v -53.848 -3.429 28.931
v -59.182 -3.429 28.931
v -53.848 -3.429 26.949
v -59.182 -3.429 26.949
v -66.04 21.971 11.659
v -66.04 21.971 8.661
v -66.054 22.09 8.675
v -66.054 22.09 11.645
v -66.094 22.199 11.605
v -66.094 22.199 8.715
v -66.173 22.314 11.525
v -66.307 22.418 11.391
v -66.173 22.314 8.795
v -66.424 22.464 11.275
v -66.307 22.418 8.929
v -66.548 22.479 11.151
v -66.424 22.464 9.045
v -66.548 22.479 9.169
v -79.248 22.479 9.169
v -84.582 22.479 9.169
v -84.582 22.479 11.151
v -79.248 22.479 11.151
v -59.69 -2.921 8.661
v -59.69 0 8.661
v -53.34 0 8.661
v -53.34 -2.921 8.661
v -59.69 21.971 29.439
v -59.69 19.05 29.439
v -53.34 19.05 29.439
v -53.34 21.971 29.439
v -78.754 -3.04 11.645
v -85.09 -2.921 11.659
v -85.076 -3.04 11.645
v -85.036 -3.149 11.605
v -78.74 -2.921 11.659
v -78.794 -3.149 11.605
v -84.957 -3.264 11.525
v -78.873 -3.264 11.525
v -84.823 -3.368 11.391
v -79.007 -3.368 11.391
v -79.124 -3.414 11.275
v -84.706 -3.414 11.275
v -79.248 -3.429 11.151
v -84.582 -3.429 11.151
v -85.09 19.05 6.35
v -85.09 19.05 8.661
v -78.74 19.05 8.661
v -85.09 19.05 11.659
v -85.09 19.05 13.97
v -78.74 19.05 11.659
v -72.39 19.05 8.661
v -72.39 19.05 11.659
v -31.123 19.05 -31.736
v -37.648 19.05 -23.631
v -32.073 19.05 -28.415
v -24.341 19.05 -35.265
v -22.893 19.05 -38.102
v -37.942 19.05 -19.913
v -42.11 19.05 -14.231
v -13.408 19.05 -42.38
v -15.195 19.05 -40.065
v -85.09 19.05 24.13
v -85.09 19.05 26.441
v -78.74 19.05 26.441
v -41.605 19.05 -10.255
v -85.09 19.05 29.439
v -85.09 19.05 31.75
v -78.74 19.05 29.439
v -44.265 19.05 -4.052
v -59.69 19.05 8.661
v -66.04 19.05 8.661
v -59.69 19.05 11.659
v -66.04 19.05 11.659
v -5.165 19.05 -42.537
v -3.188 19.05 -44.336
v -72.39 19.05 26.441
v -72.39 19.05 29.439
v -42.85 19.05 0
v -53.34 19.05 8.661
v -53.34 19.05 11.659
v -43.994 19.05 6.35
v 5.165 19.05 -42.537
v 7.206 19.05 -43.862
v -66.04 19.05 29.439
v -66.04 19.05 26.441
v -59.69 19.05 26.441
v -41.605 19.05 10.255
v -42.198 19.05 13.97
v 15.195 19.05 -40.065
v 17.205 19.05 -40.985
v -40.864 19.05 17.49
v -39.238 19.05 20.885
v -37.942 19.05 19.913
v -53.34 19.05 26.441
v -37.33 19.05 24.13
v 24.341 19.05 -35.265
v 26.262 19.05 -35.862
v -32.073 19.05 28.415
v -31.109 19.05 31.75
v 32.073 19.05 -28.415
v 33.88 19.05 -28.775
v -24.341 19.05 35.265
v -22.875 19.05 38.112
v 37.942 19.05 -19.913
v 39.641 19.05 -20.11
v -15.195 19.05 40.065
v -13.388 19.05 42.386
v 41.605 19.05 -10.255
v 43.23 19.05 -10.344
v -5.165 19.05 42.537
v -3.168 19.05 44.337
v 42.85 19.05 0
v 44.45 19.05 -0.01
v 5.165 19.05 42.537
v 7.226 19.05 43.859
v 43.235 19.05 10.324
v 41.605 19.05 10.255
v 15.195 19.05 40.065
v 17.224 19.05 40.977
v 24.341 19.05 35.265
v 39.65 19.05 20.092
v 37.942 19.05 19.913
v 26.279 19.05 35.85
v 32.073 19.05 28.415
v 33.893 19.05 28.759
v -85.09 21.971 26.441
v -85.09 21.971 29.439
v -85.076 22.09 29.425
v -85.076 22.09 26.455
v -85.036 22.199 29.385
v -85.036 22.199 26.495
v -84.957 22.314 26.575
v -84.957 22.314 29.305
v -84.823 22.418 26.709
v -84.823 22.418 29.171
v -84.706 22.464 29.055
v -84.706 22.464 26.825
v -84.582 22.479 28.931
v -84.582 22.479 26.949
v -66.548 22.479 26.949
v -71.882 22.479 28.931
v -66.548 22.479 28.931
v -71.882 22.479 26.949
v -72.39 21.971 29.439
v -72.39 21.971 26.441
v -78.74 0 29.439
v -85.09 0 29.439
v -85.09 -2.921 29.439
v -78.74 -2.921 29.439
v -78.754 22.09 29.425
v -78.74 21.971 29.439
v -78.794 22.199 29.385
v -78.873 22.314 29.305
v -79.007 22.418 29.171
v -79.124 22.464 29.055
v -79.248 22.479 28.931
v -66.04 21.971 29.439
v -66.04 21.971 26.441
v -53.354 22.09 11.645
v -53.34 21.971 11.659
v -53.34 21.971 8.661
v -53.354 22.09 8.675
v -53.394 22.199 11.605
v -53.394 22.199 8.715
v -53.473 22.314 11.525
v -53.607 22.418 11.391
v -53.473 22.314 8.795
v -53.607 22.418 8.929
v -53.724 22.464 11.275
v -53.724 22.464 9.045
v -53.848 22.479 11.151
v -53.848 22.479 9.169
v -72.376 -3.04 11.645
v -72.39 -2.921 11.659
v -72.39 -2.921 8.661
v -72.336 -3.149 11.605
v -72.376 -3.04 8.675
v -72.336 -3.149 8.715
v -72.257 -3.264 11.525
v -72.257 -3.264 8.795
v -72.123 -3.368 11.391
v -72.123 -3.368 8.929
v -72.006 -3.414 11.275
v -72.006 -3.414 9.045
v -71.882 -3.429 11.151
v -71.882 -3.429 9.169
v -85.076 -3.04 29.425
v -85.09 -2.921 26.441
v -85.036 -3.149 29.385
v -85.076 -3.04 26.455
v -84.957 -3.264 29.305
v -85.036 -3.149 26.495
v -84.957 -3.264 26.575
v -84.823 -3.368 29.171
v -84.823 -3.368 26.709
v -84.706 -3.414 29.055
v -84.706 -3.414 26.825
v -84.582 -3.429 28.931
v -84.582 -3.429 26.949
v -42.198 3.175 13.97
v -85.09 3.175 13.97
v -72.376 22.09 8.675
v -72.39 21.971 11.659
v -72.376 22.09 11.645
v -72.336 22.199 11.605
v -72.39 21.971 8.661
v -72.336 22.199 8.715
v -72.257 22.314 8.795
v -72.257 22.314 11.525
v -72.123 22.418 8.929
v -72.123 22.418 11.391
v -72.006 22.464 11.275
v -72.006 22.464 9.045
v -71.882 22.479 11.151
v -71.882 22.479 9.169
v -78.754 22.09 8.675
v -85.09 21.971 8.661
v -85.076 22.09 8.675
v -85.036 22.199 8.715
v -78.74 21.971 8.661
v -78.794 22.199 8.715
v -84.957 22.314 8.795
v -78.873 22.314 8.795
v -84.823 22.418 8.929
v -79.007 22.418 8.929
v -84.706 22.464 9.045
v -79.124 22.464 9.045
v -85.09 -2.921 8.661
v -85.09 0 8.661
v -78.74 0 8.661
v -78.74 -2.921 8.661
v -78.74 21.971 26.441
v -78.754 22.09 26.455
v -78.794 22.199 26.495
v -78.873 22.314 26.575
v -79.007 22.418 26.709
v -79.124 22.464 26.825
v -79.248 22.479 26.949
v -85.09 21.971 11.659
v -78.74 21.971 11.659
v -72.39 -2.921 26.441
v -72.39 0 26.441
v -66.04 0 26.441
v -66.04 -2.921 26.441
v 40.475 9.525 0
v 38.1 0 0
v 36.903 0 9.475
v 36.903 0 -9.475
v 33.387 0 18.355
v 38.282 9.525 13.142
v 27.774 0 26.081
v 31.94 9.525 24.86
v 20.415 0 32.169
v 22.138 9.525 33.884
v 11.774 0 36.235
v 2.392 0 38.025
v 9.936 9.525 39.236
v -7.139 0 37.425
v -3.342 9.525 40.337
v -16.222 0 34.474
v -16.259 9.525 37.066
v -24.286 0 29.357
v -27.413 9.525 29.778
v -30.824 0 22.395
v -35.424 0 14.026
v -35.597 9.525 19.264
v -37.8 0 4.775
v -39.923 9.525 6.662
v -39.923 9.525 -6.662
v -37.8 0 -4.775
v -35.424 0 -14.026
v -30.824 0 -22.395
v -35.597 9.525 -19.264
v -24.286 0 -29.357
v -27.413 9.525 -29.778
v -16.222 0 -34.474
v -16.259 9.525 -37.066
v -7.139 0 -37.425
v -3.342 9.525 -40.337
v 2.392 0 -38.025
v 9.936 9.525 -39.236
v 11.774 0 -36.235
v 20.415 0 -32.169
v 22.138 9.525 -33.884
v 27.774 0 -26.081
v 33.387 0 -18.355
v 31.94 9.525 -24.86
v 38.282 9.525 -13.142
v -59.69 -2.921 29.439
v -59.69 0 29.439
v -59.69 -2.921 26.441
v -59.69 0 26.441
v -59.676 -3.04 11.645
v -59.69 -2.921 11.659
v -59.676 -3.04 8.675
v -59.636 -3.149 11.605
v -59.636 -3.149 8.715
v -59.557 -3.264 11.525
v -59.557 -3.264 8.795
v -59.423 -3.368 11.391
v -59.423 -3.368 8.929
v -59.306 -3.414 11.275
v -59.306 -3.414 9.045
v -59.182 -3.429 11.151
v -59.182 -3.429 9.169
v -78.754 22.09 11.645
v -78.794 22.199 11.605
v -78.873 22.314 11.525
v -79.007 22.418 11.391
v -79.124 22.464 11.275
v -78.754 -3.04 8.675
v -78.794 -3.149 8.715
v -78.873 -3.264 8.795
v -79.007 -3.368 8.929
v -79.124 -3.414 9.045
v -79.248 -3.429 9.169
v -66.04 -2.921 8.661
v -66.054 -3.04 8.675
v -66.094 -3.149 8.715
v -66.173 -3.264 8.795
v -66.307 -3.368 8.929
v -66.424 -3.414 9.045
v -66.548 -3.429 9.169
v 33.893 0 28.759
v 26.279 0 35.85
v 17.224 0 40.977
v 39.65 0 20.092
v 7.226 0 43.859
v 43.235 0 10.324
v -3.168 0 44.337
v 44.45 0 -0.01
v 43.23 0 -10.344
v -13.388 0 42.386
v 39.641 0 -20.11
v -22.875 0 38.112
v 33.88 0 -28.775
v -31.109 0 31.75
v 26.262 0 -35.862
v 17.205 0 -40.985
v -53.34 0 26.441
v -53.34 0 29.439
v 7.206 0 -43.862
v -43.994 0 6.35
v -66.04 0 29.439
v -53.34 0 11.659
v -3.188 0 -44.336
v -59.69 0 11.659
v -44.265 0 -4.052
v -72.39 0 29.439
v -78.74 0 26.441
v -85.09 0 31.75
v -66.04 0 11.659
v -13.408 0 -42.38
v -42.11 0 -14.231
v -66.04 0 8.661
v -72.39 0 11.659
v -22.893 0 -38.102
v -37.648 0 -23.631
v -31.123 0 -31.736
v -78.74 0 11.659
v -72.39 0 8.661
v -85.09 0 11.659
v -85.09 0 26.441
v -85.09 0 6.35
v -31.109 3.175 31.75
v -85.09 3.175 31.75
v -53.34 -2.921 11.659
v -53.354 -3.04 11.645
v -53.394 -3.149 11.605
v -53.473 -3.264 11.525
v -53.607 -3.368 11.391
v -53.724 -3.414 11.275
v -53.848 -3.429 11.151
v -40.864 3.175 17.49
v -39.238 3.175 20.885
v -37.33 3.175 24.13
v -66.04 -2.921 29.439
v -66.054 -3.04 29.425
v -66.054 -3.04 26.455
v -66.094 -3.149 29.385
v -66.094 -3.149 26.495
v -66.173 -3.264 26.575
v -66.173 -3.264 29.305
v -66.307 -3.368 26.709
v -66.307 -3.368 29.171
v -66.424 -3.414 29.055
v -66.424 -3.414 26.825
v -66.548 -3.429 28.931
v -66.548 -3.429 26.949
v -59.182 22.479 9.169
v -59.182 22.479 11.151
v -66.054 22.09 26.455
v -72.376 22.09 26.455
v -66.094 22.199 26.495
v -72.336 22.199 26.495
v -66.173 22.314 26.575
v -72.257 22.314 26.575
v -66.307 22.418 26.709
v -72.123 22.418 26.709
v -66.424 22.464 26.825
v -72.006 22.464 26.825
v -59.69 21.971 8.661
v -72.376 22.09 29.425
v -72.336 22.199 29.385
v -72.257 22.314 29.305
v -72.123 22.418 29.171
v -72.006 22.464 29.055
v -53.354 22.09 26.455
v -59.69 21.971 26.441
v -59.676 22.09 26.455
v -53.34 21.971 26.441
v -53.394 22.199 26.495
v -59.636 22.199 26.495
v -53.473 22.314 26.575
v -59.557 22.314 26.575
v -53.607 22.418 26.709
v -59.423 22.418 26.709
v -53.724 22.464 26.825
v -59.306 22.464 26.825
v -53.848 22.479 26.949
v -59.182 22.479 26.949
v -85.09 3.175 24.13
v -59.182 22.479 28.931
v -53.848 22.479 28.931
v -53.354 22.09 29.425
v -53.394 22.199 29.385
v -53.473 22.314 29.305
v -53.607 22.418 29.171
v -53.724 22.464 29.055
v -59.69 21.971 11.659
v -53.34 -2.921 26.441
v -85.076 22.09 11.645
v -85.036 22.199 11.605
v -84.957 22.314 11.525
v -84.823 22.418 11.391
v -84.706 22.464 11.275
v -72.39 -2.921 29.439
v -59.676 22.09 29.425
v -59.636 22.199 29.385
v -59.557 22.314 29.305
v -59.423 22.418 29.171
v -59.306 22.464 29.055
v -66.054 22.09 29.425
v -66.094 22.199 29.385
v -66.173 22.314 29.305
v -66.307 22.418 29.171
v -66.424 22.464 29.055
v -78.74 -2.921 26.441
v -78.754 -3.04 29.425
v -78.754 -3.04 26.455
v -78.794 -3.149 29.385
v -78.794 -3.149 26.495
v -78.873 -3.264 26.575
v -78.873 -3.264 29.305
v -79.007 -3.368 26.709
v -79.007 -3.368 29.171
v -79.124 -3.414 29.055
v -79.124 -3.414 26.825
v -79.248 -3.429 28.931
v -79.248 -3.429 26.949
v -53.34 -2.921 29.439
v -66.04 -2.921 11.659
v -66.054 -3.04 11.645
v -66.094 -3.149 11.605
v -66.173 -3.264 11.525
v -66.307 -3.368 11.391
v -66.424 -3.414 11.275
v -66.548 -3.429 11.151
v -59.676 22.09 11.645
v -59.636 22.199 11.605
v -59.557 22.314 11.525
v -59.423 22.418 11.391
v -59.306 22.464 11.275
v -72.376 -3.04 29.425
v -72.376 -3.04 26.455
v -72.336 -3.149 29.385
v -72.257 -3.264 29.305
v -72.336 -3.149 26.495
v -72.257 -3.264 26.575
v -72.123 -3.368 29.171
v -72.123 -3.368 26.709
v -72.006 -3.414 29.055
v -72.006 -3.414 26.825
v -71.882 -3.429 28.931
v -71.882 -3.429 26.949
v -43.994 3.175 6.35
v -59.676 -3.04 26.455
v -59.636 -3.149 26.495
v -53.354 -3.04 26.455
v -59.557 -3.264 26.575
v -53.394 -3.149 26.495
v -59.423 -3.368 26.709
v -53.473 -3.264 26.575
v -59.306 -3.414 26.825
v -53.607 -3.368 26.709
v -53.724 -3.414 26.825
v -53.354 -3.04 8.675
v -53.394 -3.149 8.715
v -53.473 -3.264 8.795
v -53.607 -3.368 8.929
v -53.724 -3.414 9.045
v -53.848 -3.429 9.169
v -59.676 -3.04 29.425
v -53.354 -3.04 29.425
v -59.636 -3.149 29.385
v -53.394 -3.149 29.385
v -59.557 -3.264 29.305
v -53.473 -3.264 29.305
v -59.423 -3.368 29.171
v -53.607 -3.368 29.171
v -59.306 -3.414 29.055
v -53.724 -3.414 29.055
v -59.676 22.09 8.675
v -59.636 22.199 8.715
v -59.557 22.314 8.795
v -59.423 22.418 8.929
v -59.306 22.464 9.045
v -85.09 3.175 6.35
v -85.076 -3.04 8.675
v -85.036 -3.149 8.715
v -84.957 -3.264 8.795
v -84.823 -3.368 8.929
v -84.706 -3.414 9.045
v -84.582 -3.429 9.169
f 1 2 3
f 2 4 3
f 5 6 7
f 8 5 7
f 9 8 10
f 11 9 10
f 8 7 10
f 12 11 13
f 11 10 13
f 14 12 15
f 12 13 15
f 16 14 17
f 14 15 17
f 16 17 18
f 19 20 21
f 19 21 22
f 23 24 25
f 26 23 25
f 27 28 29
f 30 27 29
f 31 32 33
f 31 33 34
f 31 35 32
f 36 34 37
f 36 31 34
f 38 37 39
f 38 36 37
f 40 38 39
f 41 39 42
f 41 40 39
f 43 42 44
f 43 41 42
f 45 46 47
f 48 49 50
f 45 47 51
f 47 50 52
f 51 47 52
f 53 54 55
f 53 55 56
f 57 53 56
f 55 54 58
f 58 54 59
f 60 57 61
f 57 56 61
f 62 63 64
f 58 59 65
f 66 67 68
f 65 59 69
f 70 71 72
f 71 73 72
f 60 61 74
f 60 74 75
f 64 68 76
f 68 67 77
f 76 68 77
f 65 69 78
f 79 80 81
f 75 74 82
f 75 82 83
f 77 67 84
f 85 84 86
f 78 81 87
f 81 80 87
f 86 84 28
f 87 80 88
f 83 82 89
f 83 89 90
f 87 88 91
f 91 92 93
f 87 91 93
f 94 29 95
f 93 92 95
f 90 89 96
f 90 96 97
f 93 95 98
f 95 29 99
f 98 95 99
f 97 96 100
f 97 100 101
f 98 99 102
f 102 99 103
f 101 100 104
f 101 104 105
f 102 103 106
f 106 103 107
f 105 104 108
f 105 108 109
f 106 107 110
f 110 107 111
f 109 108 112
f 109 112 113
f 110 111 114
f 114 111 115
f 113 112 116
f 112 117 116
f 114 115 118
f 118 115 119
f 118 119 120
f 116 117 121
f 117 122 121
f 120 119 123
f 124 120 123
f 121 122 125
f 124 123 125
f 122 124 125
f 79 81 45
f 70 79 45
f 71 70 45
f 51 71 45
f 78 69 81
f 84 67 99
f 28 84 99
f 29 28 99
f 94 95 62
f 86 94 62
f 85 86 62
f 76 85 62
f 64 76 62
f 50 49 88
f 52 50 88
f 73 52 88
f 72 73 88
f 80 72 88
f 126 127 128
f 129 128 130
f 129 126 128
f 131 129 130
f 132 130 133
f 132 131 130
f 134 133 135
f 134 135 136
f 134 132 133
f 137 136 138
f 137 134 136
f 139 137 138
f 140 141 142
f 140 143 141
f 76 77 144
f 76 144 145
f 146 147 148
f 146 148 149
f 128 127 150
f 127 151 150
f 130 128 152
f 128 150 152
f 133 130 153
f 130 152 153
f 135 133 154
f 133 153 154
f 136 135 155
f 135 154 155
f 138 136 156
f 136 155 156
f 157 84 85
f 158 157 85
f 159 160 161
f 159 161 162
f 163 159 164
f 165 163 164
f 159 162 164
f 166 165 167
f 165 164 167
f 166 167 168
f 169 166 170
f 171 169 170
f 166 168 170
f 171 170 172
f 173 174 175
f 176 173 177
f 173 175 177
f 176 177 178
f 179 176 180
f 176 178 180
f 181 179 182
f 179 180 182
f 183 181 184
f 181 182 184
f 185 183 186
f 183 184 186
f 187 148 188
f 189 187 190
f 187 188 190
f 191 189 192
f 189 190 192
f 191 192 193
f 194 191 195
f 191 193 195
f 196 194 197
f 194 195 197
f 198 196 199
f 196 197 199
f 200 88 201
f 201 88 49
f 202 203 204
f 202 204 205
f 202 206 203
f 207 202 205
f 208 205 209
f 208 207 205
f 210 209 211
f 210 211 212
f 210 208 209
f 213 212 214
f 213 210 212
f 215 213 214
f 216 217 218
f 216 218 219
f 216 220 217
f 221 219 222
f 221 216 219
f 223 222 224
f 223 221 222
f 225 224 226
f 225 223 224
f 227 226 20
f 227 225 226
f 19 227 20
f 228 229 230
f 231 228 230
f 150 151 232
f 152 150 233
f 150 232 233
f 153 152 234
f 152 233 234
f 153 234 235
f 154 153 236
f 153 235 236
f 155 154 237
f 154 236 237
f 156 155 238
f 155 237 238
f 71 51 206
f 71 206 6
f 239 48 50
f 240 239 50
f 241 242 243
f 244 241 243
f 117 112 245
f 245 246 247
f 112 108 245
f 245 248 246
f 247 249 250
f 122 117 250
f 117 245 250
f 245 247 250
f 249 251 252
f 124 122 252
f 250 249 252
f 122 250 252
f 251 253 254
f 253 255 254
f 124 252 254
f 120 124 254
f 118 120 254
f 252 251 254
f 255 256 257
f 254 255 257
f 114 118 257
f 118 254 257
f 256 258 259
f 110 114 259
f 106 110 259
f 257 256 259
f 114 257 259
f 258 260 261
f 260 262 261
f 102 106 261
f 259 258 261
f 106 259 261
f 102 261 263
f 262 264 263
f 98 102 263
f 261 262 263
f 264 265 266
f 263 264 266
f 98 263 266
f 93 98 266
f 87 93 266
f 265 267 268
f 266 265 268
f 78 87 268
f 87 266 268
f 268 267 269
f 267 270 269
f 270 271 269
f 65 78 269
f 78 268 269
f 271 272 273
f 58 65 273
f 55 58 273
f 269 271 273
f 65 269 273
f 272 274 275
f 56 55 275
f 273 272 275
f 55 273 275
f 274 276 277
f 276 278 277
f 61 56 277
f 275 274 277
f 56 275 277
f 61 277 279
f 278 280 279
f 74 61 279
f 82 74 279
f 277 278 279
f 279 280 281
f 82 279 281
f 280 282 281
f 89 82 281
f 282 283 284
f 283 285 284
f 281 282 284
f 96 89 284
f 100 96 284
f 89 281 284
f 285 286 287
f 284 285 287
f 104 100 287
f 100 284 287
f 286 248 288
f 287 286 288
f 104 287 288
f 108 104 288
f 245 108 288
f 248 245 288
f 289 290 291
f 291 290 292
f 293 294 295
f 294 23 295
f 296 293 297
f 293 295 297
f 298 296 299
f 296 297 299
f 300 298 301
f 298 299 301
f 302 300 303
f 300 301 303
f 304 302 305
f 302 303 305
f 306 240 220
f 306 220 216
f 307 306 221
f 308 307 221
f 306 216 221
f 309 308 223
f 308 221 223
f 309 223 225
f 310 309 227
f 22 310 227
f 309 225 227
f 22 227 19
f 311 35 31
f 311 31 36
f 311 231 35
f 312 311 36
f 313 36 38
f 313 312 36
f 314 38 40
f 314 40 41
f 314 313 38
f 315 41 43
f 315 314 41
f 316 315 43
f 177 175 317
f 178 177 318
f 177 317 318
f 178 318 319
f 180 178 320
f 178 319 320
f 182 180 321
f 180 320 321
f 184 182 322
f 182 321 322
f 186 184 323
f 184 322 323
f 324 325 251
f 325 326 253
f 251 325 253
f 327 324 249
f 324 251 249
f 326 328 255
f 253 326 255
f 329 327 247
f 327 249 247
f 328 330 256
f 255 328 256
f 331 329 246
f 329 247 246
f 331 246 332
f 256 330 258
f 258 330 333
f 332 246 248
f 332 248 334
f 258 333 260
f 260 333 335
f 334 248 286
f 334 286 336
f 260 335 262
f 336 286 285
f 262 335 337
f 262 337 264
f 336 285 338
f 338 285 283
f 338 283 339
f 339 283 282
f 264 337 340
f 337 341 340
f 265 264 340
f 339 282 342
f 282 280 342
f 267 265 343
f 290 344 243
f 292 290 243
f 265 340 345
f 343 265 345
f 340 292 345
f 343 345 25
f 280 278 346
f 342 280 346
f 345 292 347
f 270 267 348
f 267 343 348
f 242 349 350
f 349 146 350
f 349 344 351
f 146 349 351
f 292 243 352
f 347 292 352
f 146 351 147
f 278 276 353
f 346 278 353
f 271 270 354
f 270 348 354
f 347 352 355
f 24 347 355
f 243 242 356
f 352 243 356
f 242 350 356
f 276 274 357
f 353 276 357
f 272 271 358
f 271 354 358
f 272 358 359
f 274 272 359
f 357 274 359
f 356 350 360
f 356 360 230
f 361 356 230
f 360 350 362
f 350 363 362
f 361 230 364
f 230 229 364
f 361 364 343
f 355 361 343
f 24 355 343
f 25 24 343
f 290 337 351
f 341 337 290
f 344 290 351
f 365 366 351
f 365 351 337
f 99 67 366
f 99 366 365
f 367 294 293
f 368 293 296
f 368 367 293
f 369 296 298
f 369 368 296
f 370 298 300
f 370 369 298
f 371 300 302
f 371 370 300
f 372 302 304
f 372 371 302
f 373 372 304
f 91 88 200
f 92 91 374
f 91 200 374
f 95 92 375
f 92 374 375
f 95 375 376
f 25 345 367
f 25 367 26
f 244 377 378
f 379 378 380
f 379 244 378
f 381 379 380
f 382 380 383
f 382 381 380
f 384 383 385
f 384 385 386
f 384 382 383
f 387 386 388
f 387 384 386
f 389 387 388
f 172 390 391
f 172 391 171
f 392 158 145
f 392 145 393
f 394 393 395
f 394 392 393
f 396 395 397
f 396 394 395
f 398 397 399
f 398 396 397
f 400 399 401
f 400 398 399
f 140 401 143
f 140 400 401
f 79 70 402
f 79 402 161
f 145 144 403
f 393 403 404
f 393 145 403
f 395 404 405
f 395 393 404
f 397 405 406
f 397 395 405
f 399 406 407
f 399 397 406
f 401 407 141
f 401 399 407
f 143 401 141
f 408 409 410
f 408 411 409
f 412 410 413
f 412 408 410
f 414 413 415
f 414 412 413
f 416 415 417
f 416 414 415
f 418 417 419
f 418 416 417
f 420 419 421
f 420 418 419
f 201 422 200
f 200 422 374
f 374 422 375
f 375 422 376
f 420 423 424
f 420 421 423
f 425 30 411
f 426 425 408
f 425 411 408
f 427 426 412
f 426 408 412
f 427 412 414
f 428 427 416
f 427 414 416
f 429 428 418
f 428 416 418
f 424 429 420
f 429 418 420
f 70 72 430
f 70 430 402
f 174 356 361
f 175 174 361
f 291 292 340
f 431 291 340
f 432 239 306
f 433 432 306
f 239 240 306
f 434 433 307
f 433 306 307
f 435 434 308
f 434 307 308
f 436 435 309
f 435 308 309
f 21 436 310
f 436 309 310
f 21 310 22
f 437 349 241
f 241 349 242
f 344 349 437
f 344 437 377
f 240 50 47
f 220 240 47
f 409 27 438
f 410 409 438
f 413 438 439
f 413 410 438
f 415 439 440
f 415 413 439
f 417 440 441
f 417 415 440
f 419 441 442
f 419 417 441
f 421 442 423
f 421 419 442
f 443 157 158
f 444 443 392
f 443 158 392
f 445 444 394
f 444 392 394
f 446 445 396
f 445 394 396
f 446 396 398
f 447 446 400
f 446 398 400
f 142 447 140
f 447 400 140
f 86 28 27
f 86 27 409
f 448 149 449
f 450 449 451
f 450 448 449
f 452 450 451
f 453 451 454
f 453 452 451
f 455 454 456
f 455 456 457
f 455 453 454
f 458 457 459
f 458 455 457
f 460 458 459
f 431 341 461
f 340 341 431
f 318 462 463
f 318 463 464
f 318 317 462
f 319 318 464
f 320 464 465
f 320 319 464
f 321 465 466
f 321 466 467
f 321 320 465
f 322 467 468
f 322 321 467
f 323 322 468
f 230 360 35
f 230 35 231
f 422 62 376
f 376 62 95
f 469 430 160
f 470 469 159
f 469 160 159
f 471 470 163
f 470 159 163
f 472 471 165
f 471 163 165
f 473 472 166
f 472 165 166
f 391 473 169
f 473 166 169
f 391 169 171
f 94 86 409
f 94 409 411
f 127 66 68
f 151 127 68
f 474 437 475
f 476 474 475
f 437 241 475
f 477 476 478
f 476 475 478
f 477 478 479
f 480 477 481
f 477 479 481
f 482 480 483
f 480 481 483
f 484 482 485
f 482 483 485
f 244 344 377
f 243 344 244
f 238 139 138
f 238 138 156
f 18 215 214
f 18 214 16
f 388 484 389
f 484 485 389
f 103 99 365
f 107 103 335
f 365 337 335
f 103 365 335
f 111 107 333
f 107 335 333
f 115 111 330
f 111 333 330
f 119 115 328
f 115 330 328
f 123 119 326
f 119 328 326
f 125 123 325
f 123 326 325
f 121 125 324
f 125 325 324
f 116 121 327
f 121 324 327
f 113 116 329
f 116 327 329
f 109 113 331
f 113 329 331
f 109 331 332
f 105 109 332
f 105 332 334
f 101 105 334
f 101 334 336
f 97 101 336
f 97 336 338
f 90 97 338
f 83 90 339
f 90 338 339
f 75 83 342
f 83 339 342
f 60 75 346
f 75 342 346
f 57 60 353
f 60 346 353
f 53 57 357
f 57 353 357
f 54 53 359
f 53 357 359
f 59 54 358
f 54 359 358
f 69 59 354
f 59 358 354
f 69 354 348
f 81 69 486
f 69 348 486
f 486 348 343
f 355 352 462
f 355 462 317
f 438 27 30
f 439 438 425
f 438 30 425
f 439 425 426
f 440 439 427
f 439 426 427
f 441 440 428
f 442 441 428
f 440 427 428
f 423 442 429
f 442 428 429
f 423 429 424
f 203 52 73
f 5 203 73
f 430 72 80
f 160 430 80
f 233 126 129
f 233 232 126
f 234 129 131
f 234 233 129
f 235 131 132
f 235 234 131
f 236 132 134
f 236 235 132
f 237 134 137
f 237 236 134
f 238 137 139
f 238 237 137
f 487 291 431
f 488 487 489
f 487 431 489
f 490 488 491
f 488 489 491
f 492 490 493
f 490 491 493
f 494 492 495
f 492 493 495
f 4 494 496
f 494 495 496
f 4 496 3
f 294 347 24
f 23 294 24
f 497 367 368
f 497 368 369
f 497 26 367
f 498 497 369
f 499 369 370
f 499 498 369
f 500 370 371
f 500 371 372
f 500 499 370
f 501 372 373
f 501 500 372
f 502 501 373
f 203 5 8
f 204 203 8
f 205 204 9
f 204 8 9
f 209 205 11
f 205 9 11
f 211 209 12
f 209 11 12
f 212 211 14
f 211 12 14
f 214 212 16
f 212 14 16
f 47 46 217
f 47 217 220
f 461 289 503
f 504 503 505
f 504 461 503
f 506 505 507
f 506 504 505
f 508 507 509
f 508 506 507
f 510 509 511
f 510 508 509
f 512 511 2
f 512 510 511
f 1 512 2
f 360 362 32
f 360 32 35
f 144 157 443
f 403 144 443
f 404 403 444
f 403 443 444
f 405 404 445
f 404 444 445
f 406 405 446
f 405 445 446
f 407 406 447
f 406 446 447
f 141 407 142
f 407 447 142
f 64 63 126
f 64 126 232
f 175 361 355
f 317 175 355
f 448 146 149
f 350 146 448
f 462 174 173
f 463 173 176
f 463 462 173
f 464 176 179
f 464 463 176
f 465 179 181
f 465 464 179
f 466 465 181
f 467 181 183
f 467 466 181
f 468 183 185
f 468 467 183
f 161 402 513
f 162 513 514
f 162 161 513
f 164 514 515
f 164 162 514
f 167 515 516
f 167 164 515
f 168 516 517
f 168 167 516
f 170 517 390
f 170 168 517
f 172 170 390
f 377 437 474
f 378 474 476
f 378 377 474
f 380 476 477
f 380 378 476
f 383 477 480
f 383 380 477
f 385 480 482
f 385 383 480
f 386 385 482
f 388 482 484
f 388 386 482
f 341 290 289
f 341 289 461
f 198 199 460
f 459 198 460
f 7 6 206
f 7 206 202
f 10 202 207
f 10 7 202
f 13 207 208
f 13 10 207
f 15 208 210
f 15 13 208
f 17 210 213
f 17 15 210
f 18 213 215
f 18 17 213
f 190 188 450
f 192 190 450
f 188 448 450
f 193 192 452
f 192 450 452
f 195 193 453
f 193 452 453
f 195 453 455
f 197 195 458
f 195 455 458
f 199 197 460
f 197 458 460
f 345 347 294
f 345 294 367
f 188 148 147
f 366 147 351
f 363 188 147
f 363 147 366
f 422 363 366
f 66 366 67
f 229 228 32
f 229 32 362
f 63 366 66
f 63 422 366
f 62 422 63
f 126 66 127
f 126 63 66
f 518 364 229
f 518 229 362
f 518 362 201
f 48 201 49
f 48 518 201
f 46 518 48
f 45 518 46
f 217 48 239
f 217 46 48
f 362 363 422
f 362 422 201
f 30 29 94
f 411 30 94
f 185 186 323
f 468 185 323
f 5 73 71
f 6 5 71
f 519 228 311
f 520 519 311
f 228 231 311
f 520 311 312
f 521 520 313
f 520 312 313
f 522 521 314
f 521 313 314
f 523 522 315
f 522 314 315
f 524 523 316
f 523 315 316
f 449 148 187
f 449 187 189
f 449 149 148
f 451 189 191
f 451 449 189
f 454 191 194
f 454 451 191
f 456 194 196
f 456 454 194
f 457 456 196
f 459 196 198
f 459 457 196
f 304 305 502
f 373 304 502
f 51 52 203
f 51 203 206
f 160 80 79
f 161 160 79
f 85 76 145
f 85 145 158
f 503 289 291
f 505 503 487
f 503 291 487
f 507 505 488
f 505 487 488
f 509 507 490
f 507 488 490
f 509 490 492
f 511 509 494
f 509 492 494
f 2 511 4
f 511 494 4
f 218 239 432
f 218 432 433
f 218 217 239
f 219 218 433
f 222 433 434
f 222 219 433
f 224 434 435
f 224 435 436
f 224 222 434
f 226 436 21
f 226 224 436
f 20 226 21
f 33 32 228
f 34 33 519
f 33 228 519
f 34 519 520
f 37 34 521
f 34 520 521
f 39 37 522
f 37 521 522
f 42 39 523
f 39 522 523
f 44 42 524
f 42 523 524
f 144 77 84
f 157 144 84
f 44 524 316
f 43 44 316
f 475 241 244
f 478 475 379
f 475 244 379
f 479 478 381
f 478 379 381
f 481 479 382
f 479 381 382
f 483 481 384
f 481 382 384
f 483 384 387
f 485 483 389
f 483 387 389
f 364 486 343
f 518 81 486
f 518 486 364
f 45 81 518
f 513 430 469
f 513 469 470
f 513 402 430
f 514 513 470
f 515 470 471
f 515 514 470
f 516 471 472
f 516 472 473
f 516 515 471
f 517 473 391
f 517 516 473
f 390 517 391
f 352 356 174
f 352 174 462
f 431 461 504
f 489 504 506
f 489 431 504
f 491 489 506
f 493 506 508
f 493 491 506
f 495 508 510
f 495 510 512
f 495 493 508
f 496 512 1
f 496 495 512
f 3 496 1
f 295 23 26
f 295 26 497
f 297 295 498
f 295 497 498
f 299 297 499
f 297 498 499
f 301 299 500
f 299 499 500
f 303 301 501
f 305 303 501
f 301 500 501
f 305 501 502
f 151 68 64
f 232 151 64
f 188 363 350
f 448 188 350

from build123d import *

# Parameters (mm, degrees)
SKETCH1_R            = 44.45
BOSS_EXTRUDE1_DEPTH  = 19.05
BOSS_EXTRUDE2_DEPTH  = 3.175
SKETCH4_W            = 53.981480267
SKETCH4_H            = 15.875
BOSS_EXTRUDE3_DEPTH  = 7.62
SKETCH5_W            = 53.981480267
SKETCH5_H            = 15.875
BOSS_EXTRUDE4_DEPTH  = 7.62
SKETCH2_R            = 38.1
CUT_EXTRUDE1_DEPTH   = 98.872432789
CUT_EXTRUDE1_DRAFT   = 14
SKETCH6_W            = 6.35
SKETCH6_H            = 2.9972
BOSS_EXTRUDE5_DEPTH  = 3.429
FILLET1_R            = 0.508
FILLET1_OF_MIRROR1_R = 0.508


with BuildPart() as part:
    # Sketch1 → Boss-Extrude1 (new body)
    with BuildSketch(Plane(origin=(0, 0, 0), x_dir=(1, 0, 0), z_dir=(0, 1, 0))):
        with Locations(Location((0, 0, 0), (0, 0, 90))):
            Circle(SKETCH1_R)
    extrude(amount=BOSS_EXTRUDE1_DEPTH)

    # Sketch3 → Boss-Extrude2 (add)
    with BuildSketch(Plane.XZ):
        with BuildLine():
            Line((-31.108519733, 31.75), (-85.09, 31.75))
            Line((-85.09, 31.75), (-85.09, 6.35))
            Line((-85.09, 6.35), (-43.994090512, 6.35))
            ThreePointArc((-43.994090512, 6.35), (-39.640768363, 20.109997105), (-31.108519733, 31.75))
        make_face()
    extrude(amount=-BOSS_EXTRUDE2_DEPTH)

    # Sketch4 → Boss-Extrude3 (add)
    with BuildSketch(Plane.XY.offset(31.75)):
        with Locations((-58.099259867, 11.1125)):
            Rectangle(SKETCH4_W, SKETCH4_H)
    extrude(amount=-BOSS_EXTRUDE3_DEPTH)

    # Sketch5 → Boss-Extrude4 (add)
    with BuildSketch(Plane(origin=(0, 0, 6.35), x_dir=(-1, 0, 0), z_dir=(0, 0, -1))):
        with Locations((58.099259867, 11.1125)):
            Rectangle(SKETCH5_W, SKETCH5_H)
    extrude(amount=-BOSS_EXTRUDE4_DEPTH)


with BuildPart() as cut_extrude1_tool:
    # Sketch2 → Cut-Extrude1 (with draft: the straight prism first)
    with BuildSketch(Plane.XZ):
        Circle(SKETCH2_R)
    extrude(amount=-CUT_EXTRUDE1_DEPTH)
    # Cut-Extrude1: the draft: its side faces are tilted about the plane it starts from
    cut_extrude1_sides = [cut_extrude1_tool.faces().sort_by_distance(p)[0] for p in [
        (-38.1, 49.436216394, 0),
    ]]
    draft(cut_extrude1_sides, Plane.XZ, CUT_EXTRUDE1_DRAFT)


with BuildPart() as part_1:
    add(part.part)

    # Cut-Extrude1: cut by cut_extrude1_tool
    add(cut_extrude1_tool.part, mode=Mode.SUBTRACT)

    # Sketch6 → Boss-Extrude5 (add)
    with BuildSketch(Plane(origin=(0, 19.05, 0), x_dir=(1, 0, 0), z_dir=(0, 1, 0))):
        with Locations((-81.915, -27.94)):
            Rectangle(SKETCH6_W, SKETCH6_H)
        with Locations((-69.215, -27.94)):
            Rectangle(SKETCH6_W, SKETCH6_H)
        with Locations((-56.515, -27.94)):
            Rectangle(SKETCH6_W, SKETCH6_H)
        with Locations((-56.515, -10.16)):
            Rectangle(SKETCH6_W, SKETCH6_H)
        with Locations((-69.215, -10.16)):
            Rectangle(SKETCH6_W, SKETCH6_H)
        with Locations((-81.915, -10.16)):
            Rectangle(SKETCH6_W, SKETCH6_H)
    boss_extrude5 = extrude(amount=BOSS_EXTRUDE5_DEPTH)

    # Fillet1
    fillet1_edges = [part_1.edges().sort_by_distance(p)[0] for p in [
        (-69.215, 22.479, 29.4386),
        (-66.04, 22.479, 27.94),
        (-69.215, 22.479, 26.4414),
        (-72.39, 22.479, 27.94),
        (-85.09, 22.479, 27.94),
        (-81.915, 22.479, 29.4386),
        (-78.74, 22.479, 27.94),
        (-81.915, 22.479, 26.4414),
        (-85.09, 22.479, 10.16),
        (-81.915, 22.479, 11.6586),
        (-78.74, 22.479, 10.16),
        (-81.915, 22.479, 8.6614),
        (-72.39, 22.479, 10.16),
        (-69.215, 22.479, 11.6586),
        (-66.04, 22.479, 10.16),
        (-69.215, 22.479, 8.6614),
        (-59.69, 22.479, 10.16),
        (-56.515, 22.479, 11.6586),
        (-53.34, 22.479, 10.16),
        (-56.515, 22.479, 8.6614),
        (-56.515, 22.479, 29.4386),
        (-53.34, 22.479, 27.94),
        (-56.515, 22.479, 26.4414),
        (-59.69, 22.479, 27.94),
    ]]
    fillet(fillet1_edges, radius=FILLET1_R)

    # Mirror1: Boss-Extrude5 across plane
    add(boss_extrude5.mirror(Plane.ZX.offset(9.525)))

    # Fillet1 of Mirror1
    fillet1_of_mirror1_edges = [part_1.edges().sort_by_distance(p)[0] for p in [
        (-69.215, -3.429, 29.4386),
        (-66.04, -3.429, 27.94),
        (-69.215, -3.429, 26.4414),
        (-72.39, -3.429, 27.94),
        (-85.09, -3.429, 27.94),
        (-81.915, -3.429, 29.4386),
        (-78.74, -3.429, 27.94),
        (-81.915, -3.429, 26.4414),
        (-85.09, -3.429, 10.16),
        (-81.915, -3.429, 11.6586),
        (-78.74, -3.429, 10.16),
        (-81.915, -3.429, 8.6614),
        (-72.39, -3.429, 10.16),
        (-69.215, -3.429, 11.6586),
        (-66.04, -3.429, 10.16),
        (-69.215, -3.429, 8.6614),
        (-59.69, -3.429, 10.16),
        (-56.515, -3.429, 11.6586),
        (-53.34, -3.429, 10.16),
        (-56.515, -3.429, 8.6614),
        (-56.515, -3.429, 29.4386),
        (-53.34, -3.429, 27.94),
        (-56.515, -3.429, 26.4414),
        (-59.69, -3.429, 27.94),
    ]]
    fillet(fillet1_of_mirror1_edges, radius=FILLET1_OF_MIRROR1_R)


solid = part_1.part
